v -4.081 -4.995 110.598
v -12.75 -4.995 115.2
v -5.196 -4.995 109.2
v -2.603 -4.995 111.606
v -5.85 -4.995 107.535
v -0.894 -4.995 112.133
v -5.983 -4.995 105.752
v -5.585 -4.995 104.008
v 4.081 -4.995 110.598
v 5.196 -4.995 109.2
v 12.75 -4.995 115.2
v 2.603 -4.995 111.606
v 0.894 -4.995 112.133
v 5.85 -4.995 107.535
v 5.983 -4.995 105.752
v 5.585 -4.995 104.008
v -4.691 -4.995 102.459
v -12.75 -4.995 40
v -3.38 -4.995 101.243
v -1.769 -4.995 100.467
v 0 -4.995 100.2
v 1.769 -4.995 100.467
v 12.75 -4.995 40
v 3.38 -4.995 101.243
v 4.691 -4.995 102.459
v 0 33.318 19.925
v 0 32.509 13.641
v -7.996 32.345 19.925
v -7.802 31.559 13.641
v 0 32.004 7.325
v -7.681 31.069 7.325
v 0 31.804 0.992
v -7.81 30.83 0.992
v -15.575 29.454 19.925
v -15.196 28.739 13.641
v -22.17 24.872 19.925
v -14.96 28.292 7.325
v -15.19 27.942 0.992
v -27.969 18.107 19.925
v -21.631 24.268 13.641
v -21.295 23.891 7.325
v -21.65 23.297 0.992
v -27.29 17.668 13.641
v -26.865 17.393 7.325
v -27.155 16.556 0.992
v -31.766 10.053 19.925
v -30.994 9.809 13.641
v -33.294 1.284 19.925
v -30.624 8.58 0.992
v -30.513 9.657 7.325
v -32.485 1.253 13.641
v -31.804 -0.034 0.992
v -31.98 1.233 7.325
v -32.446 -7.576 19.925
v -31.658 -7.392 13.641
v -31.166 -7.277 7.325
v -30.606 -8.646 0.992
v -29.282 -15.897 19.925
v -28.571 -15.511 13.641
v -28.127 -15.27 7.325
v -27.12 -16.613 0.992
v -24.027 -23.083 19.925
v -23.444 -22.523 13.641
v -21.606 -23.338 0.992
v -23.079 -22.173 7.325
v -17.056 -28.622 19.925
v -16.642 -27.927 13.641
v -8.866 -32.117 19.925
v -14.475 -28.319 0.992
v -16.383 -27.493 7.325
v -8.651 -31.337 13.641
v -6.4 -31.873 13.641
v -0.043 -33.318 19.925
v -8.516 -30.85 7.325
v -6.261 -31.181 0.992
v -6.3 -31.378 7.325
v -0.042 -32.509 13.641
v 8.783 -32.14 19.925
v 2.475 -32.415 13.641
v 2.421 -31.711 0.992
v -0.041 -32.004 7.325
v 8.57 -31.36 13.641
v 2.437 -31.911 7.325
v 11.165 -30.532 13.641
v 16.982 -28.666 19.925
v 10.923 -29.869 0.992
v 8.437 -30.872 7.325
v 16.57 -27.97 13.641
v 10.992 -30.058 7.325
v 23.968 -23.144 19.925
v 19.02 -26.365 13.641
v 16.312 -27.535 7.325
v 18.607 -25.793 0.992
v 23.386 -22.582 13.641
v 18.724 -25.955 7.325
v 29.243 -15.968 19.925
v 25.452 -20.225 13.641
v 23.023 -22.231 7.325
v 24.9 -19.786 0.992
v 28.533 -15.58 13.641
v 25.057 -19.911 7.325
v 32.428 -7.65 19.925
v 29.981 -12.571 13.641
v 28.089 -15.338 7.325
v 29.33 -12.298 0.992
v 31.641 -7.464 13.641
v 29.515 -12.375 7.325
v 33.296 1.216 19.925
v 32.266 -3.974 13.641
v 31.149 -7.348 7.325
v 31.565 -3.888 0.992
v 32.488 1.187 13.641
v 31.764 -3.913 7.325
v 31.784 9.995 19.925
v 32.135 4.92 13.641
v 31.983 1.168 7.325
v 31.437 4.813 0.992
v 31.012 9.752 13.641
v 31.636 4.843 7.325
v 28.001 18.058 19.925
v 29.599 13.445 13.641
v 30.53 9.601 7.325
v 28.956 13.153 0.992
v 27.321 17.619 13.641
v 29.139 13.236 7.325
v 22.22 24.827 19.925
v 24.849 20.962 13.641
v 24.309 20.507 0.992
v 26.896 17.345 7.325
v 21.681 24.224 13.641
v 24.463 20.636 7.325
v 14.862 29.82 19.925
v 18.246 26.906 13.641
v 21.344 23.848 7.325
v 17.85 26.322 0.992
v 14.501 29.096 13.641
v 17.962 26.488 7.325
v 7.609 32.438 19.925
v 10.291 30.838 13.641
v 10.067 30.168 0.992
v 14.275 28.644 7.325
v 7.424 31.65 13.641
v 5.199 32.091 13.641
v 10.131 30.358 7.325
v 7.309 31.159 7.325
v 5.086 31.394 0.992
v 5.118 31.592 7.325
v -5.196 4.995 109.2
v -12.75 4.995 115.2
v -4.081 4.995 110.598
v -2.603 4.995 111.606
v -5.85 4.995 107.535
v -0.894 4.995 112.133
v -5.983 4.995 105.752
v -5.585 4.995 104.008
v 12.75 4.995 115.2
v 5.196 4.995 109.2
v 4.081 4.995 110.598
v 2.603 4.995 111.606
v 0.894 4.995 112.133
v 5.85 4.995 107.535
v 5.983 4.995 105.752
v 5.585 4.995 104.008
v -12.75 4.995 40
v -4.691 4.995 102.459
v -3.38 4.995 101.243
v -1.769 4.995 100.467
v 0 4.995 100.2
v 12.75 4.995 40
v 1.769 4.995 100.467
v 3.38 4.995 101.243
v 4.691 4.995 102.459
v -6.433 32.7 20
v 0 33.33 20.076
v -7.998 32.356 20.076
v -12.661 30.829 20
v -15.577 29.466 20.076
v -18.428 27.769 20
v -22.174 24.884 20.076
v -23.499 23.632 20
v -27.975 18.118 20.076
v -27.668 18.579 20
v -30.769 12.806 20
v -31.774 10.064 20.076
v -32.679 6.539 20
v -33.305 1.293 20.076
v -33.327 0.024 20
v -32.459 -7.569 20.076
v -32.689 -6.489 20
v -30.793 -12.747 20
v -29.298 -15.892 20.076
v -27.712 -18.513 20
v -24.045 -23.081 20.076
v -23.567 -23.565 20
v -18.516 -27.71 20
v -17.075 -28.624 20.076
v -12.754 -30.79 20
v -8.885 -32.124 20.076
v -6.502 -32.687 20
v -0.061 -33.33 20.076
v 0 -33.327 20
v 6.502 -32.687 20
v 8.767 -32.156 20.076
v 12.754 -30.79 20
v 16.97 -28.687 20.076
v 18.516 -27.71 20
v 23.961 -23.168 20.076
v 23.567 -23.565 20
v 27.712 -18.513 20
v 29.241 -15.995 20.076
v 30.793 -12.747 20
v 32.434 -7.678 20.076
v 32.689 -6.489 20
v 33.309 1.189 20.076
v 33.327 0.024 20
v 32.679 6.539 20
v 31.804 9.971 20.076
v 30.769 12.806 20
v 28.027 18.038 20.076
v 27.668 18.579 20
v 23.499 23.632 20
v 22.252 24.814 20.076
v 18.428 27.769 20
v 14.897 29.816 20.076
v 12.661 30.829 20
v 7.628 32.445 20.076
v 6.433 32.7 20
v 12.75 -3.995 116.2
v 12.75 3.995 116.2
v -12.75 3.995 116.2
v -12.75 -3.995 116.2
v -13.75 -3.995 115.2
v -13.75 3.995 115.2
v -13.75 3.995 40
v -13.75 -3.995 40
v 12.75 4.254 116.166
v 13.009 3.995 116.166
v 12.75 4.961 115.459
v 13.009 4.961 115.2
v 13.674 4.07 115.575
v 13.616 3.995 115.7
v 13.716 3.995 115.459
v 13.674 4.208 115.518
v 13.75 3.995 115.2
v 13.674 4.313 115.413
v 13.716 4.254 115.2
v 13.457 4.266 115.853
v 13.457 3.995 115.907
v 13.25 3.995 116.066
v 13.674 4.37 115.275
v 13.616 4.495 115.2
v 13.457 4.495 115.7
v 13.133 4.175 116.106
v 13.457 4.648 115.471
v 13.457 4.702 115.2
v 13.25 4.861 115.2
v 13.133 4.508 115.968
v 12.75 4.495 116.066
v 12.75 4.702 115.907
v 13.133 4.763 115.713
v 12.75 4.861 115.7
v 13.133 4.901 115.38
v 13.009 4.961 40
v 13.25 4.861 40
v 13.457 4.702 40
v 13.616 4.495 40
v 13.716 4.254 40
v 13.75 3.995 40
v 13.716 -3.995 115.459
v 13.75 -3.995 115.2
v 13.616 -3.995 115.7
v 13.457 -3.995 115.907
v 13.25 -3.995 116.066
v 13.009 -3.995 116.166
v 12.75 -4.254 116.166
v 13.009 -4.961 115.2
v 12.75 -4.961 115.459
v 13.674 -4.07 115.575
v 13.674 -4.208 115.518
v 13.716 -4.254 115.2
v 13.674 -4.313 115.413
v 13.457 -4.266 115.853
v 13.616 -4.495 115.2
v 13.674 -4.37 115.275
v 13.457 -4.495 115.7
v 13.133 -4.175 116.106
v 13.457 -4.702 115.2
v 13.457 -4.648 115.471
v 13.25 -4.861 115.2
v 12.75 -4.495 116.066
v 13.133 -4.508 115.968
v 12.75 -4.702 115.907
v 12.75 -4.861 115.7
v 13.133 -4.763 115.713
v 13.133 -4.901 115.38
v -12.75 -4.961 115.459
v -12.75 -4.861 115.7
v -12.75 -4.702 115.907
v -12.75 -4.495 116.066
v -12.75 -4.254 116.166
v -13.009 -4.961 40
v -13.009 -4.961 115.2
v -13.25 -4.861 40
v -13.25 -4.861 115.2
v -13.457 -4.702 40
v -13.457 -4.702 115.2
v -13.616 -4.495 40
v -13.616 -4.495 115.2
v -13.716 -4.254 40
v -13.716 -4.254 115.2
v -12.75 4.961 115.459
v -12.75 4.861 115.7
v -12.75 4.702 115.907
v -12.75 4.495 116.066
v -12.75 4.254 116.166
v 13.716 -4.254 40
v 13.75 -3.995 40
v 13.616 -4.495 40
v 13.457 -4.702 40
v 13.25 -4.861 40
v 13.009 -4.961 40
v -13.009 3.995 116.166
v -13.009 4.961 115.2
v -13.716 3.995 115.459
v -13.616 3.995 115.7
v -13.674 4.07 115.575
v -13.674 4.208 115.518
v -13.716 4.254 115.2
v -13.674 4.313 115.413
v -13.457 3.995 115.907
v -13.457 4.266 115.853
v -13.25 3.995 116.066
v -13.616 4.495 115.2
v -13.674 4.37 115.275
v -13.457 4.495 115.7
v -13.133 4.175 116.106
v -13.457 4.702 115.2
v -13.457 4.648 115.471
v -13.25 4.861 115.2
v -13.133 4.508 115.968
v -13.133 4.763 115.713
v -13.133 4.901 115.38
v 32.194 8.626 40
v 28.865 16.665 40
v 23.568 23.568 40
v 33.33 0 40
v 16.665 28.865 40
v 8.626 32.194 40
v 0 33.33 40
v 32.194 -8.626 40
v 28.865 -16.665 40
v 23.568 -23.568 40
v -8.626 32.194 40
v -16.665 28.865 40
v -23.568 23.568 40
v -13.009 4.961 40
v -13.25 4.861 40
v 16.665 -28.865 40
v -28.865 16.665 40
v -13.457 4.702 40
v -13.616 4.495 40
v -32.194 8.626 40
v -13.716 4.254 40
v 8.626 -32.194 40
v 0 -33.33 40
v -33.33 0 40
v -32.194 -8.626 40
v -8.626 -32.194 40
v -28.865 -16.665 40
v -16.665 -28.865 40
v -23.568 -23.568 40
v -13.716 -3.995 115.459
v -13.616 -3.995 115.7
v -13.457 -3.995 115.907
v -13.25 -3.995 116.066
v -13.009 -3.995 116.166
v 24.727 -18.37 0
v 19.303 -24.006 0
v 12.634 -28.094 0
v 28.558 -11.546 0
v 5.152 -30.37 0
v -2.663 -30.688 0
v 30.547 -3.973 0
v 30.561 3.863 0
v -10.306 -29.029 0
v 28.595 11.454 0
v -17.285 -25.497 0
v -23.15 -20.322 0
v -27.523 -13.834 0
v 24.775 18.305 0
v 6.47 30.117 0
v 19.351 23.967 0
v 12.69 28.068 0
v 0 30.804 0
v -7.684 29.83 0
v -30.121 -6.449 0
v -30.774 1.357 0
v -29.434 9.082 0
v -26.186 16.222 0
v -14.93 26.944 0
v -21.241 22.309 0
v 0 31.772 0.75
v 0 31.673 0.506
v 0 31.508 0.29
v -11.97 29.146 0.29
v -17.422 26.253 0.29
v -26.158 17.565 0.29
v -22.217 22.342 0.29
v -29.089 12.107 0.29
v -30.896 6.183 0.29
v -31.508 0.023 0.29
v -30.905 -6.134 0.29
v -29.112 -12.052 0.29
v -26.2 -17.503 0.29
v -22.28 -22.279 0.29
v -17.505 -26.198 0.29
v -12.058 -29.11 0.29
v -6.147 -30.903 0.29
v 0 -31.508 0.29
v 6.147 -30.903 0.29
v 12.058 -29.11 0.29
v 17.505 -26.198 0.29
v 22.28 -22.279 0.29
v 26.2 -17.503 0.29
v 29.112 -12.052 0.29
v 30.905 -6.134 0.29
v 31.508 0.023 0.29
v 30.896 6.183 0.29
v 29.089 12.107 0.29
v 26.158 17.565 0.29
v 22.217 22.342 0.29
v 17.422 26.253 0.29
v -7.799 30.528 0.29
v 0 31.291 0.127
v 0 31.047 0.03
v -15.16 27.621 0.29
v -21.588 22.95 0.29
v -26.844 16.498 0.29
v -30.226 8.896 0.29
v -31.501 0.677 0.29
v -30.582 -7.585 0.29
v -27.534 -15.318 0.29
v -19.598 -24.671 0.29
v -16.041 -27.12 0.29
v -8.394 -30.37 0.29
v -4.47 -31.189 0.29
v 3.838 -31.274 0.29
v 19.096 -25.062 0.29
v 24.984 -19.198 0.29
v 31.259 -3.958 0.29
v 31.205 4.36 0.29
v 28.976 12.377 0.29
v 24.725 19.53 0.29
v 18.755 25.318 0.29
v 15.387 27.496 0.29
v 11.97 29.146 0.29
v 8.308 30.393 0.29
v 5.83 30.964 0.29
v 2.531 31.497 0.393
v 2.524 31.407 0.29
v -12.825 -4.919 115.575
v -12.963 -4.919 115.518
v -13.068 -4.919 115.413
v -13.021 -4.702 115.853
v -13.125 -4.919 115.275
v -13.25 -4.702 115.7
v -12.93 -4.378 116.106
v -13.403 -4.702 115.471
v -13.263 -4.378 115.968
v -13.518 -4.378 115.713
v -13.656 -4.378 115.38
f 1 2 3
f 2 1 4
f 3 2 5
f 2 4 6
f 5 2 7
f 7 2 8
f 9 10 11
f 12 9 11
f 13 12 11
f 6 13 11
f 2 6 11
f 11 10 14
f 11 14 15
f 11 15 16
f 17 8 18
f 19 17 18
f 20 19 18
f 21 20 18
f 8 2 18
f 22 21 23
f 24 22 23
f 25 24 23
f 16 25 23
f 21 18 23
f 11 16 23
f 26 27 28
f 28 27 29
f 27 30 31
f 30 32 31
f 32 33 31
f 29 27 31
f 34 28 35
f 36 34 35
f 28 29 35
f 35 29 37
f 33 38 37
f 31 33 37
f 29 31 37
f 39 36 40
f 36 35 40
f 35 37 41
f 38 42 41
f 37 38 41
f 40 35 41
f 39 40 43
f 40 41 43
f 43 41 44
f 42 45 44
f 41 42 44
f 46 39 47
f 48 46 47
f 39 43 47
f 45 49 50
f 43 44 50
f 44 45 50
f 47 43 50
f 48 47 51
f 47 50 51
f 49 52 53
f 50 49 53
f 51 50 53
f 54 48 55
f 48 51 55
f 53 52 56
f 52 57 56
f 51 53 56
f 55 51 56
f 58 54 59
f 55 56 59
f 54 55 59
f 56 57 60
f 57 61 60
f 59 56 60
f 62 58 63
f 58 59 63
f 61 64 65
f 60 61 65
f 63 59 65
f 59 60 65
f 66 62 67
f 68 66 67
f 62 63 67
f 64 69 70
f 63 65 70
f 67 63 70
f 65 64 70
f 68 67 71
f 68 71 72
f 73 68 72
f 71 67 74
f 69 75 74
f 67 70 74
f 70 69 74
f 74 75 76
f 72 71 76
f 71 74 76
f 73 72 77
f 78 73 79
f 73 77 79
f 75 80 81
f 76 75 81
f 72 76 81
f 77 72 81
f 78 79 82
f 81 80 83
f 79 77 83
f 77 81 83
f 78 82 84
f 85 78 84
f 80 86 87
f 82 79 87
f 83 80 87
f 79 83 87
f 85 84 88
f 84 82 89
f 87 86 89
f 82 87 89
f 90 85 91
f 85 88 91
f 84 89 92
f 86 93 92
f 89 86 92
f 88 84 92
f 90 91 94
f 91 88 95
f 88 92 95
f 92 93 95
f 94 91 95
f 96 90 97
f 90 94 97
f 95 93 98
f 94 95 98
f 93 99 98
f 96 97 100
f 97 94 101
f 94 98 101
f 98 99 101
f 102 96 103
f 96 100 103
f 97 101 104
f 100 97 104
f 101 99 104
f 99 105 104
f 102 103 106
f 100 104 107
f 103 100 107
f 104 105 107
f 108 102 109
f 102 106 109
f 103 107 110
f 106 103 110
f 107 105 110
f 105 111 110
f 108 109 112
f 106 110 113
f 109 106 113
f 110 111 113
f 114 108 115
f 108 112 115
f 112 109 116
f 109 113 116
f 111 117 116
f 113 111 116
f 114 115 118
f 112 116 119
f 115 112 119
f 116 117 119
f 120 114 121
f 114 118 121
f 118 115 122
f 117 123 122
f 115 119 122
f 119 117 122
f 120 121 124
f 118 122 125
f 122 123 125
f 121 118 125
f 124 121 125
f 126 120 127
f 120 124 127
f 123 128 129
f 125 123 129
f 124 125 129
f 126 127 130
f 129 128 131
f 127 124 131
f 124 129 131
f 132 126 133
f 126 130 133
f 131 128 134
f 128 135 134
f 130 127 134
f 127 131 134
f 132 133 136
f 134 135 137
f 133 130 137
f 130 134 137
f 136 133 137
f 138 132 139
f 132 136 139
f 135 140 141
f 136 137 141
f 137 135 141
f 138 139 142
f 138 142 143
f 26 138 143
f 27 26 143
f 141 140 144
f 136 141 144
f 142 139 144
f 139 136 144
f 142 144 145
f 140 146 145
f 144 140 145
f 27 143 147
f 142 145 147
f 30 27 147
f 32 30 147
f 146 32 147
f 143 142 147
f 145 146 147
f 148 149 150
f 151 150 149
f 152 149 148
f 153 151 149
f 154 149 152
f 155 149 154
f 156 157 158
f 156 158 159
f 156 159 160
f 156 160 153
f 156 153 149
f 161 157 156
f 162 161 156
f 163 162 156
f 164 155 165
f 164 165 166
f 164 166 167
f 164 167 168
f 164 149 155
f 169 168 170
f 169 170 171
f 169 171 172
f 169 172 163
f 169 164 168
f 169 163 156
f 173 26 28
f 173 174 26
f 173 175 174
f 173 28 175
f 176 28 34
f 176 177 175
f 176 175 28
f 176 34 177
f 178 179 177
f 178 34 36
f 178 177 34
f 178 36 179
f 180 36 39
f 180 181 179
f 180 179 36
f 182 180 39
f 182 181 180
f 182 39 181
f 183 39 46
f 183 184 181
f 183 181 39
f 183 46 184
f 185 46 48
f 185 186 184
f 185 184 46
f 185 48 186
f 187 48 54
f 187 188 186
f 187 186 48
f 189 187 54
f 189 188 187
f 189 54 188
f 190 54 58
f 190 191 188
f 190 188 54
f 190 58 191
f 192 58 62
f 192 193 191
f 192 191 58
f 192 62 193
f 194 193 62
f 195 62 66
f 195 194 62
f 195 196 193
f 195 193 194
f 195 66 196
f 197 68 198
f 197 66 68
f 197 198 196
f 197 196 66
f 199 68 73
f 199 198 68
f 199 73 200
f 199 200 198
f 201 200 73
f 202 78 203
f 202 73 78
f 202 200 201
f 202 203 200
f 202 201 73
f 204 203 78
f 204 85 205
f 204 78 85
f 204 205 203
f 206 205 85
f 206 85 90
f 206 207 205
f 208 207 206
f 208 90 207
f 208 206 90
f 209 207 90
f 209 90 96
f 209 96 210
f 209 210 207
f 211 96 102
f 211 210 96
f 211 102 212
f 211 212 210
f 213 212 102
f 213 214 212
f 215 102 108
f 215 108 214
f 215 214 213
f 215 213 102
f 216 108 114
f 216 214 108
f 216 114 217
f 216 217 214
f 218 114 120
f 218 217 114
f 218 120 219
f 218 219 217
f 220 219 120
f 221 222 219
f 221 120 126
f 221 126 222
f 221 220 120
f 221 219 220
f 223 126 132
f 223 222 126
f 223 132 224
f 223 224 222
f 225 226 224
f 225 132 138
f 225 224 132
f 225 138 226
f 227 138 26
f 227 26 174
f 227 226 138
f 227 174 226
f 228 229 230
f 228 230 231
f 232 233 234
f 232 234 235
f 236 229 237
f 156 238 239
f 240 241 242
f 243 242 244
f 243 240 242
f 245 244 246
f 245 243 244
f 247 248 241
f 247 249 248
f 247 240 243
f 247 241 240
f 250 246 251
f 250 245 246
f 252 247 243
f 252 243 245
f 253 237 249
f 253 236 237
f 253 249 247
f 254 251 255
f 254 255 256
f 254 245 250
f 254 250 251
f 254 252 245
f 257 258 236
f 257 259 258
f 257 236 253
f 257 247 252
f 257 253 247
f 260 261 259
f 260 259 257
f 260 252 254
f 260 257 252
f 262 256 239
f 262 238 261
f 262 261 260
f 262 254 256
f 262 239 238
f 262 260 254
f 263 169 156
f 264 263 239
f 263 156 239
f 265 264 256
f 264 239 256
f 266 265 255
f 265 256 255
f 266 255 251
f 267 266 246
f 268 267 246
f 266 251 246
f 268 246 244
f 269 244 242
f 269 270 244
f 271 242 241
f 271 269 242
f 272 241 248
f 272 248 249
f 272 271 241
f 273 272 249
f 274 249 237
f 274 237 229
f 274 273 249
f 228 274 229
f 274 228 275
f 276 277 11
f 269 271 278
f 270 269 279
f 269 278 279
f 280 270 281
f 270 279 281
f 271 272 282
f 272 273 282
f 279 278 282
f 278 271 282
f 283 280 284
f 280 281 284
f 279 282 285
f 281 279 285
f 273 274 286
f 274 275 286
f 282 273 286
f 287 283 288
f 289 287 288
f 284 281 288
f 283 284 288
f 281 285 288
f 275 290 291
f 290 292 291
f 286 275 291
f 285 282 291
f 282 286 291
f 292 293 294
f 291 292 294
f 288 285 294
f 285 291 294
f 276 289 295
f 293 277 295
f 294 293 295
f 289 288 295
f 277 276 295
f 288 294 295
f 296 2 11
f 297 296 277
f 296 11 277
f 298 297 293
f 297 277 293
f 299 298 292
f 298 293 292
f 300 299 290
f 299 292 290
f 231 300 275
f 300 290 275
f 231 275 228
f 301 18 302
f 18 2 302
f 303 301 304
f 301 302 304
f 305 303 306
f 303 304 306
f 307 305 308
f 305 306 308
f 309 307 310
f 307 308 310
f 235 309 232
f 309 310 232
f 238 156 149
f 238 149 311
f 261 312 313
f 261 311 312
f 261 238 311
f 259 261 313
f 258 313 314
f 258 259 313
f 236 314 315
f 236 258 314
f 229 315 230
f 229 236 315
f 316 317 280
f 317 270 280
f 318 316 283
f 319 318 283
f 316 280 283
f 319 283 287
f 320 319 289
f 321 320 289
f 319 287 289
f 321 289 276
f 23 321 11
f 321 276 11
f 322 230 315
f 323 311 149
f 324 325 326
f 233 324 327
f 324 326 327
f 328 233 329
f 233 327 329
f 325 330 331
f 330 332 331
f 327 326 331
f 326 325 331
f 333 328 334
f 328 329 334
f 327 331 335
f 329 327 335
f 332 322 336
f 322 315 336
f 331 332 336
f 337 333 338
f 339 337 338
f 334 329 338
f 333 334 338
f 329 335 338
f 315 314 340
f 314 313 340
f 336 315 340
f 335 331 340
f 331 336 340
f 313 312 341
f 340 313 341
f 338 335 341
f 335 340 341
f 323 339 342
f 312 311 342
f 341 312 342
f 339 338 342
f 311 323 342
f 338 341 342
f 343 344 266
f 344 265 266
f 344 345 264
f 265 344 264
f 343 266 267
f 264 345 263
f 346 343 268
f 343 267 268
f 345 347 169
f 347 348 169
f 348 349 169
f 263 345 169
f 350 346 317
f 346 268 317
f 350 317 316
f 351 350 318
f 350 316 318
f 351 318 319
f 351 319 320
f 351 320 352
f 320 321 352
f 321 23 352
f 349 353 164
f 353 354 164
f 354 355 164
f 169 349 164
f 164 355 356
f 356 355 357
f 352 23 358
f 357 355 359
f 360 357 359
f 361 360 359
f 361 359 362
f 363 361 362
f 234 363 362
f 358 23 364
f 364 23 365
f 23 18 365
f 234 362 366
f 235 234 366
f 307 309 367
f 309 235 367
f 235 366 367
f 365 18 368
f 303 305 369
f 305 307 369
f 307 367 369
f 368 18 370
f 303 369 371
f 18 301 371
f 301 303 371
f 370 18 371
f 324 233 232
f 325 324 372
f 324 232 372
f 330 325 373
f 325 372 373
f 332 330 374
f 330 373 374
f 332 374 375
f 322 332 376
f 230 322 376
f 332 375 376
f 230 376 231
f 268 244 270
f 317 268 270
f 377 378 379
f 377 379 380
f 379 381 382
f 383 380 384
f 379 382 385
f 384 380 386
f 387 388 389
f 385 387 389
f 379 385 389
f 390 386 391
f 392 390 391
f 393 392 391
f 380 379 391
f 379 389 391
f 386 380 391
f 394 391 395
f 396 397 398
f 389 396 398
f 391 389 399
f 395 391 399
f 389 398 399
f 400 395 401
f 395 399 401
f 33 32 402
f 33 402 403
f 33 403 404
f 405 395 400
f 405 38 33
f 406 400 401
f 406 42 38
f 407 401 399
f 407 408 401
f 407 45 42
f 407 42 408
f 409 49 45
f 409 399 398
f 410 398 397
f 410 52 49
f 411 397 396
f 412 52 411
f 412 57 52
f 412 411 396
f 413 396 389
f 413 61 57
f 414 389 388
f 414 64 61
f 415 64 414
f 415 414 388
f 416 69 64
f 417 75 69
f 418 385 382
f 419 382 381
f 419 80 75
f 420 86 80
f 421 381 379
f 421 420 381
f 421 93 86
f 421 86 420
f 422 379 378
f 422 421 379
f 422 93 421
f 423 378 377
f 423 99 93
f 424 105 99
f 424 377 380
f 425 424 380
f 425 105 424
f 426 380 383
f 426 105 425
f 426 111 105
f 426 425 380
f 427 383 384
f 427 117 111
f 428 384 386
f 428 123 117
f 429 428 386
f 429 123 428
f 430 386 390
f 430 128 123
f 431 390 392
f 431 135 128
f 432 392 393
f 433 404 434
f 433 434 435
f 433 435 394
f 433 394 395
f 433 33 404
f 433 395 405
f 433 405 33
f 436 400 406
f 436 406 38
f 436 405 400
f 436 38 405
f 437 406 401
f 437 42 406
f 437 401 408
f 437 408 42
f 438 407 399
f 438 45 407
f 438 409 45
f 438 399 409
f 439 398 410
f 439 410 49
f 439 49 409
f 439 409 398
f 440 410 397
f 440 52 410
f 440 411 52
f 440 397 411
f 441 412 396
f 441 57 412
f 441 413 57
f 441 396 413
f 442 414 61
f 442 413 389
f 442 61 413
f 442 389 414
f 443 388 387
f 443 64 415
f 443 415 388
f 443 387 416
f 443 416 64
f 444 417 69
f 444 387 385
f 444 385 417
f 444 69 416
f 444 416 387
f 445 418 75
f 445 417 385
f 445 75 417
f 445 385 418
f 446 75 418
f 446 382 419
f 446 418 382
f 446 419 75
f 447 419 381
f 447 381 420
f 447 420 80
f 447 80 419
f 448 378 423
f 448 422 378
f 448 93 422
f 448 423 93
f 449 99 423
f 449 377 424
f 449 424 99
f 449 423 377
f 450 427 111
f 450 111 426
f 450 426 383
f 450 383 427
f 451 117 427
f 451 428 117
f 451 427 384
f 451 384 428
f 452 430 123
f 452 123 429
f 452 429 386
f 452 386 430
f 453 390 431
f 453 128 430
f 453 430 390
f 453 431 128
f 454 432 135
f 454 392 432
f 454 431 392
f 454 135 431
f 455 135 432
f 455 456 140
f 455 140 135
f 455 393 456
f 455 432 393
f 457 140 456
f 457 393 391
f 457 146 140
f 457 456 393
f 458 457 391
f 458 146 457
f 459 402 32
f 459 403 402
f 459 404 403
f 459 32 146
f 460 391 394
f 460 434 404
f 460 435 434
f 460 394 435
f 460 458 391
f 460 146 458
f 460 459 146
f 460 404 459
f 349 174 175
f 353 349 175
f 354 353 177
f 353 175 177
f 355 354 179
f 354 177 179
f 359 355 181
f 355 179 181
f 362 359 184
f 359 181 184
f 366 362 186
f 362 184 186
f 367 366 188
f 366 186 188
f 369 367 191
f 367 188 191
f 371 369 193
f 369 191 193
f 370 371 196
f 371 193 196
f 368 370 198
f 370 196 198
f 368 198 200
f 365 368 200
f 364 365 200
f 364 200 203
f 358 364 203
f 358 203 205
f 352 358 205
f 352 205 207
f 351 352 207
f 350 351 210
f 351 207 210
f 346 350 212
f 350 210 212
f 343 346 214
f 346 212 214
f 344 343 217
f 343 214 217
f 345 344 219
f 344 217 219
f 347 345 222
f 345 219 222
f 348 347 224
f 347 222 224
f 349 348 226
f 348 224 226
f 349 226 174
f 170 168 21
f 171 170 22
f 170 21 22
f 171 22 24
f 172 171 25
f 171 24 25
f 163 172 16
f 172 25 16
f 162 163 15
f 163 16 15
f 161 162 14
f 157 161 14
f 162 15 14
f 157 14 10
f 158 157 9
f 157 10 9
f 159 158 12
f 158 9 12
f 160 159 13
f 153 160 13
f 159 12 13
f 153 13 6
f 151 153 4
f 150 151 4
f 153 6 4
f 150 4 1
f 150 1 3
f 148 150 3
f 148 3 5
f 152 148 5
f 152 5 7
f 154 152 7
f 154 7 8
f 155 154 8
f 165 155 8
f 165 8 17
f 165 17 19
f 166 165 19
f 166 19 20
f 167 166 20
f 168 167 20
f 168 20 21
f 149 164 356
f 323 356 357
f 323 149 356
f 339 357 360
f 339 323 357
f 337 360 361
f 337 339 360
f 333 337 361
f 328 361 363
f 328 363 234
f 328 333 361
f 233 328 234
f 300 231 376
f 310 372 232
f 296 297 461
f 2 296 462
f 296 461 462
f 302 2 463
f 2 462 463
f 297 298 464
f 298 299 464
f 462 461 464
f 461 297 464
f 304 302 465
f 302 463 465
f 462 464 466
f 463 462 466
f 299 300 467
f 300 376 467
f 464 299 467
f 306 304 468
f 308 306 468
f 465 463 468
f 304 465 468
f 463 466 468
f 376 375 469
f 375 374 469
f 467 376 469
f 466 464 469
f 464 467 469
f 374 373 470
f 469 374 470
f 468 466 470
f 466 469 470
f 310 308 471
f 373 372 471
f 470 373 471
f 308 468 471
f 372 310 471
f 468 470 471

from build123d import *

# Parameters (mm, degrees)
SKETCH017_W     = 9.99
SKETCH017_H     = 27.5
PAD007_DEPTH    = 76.2
SKETCH018_R     = 6
POCKET005_DEPTH = 38.326
FILLET003_R     = 1
FILLET004_R     = 1


with BuildPart() as part:
    # Sketch016 → Revolution004 (revolve)
    with BuildSketch(Plane.YZ):
        with BuildLine():
            Line((0, 40), (33.33, 40))
            Line((33.33, 40), (33.33, 20))
            ThreePointArc((33.33, 20), (32.183058, 10.029219), (31.8, 0))
            Line((31.8, 0), (0, 0))
            Line((0, 40), (0, 0))
        make_face()
    revolve(axis=Axis((0, 0, 0), (0, 0, 1)))

    # Sketch017 (on Face1 of Revolution004) → Pad007 (new body)
    with BuildSketch(Plane(origin=(0, 0, 40), x_dir=(0, -1, 0), z_dir=(0, 0, 1))):
        Rectangle(SKETCH017_W, SKETCH017_H)
    extrude(amount=PAD007_DEPTH)

    # Sketch018 (on Face5 of Pad007) → Pocket005 (cut, through all)
    with BuildSketch(Plane(origin=(0, -4.995, 0), x_dir=(0, 0, -1), z_dir=(0, -1, 0))):
        with Locations((-106.2, 0)):
            Circle(SKETCH018_R)
    extrude(amount=-POCKET005_DEPTH, mode=Mode.SUBTRACT)

    # Fillet003
    fillet003_edges = [part.edges().sort_by_distance(p)[0] for p in [
        (0, 4.995, 116.2),
        (-13.75, 0, 116.2),
        (0, -4.995, 116.2),
        (13.75, 0, 116.2),
        (13.75, -4.995, 78.1),
        (13.75, 4.995, 78.1),
        (-13.75, 4.995, 78.1),
        (-13.75, -4.995, 78.1),
    ]]
    fillet(fillet003_edges, radius=FILLET003_R)

    # Fillet004
    fillet004_edges = [part.edges().sort_by_distance(p)[0] for p in [
        (0, -33.33, 20),
        (0, -31.8, 0),
    ]]
    fillet(fillet004_edges, radius=FILLET004_R)


solid = part.part
